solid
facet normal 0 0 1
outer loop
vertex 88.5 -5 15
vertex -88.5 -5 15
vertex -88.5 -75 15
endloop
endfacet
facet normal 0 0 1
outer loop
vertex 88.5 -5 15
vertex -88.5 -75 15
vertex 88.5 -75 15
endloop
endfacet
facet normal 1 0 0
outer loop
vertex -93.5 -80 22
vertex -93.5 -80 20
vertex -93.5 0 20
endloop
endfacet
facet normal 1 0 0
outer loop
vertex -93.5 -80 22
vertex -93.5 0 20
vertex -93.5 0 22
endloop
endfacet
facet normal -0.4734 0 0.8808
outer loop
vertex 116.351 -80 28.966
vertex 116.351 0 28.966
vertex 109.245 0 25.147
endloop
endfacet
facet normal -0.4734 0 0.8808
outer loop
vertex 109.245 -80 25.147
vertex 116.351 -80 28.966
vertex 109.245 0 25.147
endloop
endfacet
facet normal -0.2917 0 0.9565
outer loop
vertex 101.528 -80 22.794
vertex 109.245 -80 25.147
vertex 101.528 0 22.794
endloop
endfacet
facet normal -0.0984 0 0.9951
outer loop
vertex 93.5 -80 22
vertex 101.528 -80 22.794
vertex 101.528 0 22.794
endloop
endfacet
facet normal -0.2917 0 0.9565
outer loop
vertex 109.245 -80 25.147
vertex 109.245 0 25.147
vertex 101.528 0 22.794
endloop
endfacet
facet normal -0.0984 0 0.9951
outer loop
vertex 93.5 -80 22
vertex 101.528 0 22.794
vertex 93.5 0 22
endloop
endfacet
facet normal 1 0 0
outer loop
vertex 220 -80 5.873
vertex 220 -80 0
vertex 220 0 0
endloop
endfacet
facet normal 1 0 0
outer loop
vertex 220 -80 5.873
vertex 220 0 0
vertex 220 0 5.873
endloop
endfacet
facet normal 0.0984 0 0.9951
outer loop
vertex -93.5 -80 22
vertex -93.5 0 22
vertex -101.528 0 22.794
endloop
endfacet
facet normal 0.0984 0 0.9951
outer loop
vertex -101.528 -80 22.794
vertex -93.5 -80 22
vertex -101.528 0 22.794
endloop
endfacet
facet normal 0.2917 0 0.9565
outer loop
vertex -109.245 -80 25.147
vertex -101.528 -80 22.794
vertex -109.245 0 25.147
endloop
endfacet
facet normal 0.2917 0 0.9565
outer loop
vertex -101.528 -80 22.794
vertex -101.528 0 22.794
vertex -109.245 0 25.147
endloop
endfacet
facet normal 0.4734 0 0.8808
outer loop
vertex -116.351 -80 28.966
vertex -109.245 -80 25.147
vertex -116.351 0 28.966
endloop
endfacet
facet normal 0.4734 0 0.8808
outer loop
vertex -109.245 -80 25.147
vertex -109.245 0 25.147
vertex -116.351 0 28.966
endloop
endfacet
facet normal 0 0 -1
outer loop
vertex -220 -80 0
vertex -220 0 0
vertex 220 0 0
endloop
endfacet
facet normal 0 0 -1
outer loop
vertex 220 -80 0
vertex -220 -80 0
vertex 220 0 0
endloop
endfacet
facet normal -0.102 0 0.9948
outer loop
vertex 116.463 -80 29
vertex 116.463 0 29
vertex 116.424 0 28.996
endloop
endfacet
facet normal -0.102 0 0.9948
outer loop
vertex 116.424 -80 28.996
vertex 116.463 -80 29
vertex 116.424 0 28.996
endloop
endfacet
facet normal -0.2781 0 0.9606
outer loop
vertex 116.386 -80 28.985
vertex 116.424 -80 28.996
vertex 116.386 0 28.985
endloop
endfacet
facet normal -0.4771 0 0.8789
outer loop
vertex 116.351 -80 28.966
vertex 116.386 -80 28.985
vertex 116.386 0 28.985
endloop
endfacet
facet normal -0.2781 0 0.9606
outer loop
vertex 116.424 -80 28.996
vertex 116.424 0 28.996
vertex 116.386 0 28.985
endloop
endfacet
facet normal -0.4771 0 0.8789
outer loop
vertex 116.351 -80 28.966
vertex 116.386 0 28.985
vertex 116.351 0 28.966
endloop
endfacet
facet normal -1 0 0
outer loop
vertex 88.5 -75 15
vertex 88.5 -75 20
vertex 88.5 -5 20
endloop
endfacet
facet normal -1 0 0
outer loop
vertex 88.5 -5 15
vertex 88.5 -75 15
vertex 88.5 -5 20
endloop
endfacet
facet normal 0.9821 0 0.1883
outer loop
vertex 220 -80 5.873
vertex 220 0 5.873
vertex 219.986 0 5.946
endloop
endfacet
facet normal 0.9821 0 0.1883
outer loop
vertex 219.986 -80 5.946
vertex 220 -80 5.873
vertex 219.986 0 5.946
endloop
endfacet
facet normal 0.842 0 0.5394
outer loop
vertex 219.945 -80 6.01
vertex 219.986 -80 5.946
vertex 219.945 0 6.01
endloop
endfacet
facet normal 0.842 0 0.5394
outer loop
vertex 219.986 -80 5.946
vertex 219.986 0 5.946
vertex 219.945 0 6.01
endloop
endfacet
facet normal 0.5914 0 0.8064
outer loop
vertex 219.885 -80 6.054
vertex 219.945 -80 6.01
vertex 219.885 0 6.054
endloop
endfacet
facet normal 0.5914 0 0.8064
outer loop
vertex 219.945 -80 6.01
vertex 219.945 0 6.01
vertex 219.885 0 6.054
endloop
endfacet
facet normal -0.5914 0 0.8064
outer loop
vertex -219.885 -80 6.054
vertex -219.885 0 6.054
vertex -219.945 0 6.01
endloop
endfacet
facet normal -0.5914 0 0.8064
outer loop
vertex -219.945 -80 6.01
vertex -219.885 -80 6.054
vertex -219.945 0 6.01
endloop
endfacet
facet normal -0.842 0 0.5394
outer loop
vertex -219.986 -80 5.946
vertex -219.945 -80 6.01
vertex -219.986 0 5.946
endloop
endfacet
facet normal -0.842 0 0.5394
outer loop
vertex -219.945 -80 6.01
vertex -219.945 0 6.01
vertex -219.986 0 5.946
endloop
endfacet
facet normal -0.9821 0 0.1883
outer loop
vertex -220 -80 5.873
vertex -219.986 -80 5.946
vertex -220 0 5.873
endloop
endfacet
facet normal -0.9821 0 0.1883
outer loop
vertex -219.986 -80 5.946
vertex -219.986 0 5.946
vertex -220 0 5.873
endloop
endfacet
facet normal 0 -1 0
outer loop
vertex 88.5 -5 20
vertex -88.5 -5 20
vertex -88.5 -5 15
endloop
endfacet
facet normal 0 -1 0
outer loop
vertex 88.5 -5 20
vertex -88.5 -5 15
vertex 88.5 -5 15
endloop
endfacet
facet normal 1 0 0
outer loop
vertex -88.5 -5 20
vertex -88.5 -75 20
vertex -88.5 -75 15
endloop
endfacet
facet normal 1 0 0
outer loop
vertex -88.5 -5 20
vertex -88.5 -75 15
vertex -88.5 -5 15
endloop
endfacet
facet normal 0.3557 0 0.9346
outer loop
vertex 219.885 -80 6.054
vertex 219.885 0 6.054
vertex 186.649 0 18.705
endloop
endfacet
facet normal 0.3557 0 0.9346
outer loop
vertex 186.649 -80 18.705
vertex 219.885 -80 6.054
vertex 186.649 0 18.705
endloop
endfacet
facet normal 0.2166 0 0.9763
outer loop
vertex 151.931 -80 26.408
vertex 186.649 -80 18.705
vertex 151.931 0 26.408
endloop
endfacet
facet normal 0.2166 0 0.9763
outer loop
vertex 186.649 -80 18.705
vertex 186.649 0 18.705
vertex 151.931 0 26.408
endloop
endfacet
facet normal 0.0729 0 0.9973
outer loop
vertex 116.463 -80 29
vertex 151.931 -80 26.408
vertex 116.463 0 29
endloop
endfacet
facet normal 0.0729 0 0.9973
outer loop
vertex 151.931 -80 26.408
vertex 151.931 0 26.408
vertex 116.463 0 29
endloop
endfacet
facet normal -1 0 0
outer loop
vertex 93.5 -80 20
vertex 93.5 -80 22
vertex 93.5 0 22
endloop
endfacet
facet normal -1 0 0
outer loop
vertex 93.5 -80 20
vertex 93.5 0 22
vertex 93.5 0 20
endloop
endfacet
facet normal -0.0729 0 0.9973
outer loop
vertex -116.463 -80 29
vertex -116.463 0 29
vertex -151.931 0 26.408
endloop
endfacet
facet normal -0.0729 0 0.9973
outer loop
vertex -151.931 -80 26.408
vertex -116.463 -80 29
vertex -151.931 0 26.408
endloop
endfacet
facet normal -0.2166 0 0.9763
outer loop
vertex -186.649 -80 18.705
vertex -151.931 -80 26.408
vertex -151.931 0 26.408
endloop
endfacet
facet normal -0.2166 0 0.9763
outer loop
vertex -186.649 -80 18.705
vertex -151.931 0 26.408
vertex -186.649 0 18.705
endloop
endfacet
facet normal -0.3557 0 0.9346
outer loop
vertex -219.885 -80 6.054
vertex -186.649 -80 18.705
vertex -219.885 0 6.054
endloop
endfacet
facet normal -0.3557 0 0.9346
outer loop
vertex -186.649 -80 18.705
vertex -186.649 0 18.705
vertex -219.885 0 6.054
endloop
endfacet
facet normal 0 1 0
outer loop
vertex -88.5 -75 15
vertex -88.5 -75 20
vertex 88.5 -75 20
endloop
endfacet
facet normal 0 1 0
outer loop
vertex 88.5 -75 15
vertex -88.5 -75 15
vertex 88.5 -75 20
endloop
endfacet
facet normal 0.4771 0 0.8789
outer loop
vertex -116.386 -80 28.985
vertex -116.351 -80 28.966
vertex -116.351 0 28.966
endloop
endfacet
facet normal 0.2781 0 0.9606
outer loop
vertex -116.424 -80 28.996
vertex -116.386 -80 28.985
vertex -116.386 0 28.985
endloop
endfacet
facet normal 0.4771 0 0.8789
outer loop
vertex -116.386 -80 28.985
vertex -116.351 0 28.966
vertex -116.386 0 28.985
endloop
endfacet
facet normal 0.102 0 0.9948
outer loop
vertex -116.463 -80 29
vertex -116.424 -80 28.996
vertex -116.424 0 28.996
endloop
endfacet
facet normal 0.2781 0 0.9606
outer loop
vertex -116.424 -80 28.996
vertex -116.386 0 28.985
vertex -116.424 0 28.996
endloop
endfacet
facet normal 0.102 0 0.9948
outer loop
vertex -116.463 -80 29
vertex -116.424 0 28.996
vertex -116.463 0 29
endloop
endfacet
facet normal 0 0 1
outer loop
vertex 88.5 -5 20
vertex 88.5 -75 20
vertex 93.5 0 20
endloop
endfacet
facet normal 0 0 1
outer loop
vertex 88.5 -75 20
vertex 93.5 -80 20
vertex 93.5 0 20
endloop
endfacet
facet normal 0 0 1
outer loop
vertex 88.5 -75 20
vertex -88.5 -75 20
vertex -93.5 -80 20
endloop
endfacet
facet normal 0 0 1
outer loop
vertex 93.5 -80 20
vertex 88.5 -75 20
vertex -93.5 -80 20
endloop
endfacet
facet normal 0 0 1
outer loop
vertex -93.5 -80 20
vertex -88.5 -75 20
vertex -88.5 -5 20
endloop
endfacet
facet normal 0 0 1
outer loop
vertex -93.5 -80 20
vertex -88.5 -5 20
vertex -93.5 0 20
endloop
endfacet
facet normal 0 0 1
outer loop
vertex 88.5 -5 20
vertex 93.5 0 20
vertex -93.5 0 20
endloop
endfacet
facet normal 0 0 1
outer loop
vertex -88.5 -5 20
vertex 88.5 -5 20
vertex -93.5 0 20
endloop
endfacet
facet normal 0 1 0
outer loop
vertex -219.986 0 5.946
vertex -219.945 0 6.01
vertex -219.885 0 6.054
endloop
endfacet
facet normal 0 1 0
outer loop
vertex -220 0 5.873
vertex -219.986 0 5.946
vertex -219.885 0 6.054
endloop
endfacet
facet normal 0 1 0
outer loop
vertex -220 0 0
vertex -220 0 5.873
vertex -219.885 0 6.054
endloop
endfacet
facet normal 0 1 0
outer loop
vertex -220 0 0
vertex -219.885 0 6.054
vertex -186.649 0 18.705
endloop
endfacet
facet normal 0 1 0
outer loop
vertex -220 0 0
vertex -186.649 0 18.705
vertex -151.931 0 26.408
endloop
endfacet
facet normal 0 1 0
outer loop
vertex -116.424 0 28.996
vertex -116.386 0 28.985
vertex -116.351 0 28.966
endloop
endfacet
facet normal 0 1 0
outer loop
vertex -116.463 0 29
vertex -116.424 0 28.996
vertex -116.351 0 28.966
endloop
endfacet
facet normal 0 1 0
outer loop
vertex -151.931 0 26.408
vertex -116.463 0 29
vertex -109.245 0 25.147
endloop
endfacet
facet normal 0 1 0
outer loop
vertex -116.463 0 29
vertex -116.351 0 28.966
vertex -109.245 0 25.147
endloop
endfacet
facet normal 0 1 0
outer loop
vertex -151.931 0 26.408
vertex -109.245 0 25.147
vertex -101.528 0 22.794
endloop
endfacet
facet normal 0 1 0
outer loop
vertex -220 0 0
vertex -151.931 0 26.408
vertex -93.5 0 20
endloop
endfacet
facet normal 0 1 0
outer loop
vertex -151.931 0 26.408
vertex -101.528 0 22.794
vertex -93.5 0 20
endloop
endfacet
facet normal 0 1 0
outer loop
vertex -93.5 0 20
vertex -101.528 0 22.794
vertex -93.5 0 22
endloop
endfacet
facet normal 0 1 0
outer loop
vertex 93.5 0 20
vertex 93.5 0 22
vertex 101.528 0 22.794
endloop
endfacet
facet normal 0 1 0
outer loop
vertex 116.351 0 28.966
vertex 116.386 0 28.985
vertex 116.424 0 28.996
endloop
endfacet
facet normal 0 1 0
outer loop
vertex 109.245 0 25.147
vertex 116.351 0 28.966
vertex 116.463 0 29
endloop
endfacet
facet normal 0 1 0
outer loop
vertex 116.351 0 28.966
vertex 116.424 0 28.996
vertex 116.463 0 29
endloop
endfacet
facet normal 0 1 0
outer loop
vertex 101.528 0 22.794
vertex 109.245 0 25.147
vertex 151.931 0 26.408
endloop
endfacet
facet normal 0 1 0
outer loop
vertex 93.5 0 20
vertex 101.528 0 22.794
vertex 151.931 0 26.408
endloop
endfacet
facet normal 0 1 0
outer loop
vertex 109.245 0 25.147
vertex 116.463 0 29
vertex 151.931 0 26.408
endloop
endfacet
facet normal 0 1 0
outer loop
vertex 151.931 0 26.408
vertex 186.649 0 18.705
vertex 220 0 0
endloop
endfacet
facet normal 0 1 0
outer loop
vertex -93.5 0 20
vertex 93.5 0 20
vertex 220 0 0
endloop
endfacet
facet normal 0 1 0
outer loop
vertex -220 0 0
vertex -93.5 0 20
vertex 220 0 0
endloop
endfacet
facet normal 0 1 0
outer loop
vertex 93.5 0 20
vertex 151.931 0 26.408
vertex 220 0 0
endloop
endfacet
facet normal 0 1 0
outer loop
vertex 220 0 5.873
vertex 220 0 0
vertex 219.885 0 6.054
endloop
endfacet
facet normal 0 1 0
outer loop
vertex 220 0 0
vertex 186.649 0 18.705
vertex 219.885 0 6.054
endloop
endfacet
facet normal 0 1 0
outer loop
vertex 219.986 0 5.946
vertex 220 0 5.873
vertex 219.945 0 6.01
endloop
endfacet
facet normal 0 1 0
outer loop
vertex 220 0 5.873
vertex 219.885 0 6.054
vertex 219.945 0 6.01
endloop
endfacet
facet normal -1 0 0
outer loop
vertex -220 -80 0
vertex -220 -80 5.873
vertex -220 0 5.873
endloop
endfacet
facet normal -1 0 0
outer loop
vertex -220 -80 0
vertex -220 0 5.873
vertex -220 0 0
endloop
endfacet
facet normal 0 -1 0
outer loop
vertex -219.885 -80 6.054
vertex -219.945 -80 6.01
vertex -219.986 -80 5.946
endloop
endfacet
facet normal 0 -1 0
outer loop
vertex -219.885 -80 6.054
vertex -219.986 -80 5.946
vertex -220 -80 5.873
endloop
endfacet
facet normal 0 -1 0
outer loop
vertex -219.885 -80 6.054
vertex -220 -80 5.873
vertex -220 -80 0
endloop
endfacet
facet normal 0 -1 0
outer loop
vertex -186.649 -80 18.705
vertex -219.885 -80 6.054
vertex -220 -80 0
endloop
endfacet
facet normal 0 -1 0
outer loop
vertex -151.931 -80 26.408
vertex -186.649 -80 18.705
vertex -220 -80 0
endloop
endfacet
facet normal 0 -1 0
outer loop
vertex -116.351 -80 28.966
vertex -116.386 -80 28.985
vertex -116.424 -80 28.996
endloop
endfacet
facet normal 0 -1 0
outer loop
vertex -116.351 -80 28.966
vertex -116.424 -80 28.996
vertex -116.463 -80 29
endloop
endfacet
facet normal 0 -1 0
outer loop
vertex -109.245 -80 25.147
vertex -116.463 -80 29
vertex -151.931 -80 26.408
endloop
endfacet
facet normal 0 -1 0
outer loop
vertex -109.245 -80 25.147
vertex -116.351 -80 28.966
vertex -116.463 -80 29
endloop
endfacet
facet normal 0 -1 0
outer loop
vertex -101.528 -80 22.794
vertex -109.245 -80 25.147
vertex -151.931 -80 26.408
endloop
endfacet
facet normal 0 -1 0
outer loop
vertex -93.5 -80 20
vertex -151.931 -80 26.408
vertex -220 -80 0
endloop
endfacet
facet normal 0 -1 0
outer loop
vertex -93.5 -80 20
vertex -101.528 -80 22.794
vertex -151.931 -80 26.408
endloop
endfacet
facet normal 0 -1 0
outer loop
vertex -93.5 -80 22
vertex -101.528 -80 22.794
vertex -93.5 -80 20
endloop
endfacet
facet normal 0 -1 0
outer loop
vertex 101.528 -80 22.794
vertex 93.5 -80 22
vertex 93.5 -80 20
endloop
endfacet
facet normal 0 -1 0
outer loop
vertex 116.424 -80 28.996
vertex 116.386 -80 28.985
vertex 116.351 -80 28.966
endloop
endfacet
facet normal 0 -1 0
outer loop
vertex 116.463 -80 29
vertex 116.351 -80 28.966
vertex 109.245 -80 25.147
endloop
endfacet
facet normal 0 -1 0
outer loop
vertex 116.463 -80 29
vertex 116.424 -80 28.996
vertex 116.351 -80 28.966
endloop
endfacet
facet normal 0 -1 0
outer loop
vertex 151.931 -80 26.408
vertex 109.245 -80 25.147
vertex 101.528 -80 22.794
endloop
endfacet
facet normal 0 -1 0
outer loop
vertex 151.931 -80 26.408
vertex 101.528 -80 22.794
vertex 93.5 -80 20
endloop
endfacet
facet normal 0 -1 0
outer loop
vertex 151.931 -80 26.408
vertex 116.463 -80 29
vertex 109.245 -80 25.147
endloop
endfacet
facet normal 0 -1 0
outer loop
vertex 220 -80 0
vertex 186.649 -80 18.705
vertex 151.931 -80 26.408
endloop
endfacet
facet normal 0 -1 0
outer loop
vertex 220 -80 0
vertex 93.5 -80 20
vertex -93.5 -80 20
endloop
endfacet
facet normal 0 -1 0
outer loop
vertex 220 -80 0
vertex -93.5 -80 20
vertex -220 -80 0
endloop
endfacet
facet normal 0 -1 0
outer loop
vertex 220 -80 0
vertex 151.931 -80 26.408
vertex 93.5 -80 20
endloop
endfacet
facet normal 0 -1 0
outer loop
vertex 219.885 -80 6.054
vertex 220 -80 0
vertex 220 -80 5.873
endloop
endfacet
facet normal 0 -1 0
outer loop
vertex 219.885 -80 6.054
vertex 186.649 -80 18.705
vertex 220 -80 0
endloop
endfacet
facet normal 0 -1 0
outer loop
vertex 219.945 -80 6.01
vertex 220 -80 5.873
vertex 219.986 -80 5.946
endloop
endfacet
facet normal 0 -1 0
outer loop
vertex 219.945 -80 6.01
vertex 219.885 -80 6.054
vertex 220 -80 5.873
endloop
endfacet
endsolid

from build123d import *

# Parameters (mm, degrees)
F1_DEPTH = 80
F3_W     = 177
F3_H     = 70
F4_DEPTH = 5


# Not quite as in the source:
# - ends of sketch curves that miss each other by under 0.0002 mm in the source are joined


with BuildPart() as f1:
    # F0 (on Front) → F1 (new body)
    with BuildSketch(Plane.XZ):
        with BuildLine():
            Line((-220, 0), (0, 0))
            Line((0, 0), (220, 0))
            Line((220, 0), (220, 5.872634))
            ThreePointArc((220, 5.872634), (219.9686827703, 5.9800868873), (219.8845387701, 6.0538885071))
            ThreePointArc((219.8845387701, 6.0538885071), (169.4297421053, 23.1880267358), (116.462901, 28.9999923785))
            ThreePointArc((116.462901, 28.9999923785), (116.4045566452, 28.9913078859), (116.3512831377, 28.9659817952))
            ThreePointArc((116.3512831377, 28.9659817952), (105.4447272771, 23.7801763601), (93.5, 22))
            Line((93.5, 22), (93.5, 20))
            Line((93.5, 20), (0, 20))
            Line((0, 20), (-93.5, 20))
            Line((-93.5, 20), (-93.5, 22))
            ThreePointArc((-93.5, 22), (-105.4447272771, 23.7801763601), (-116.351282957, 28.965982064))
            ThreePointArc((-116.351282957, 28.965982064), (-116.4045566452, 28.9913078859), (-116.462901, 28.9999919938))
            ThreePointArc((-116.462901, 28.9999919938), (-169.4297421053, 23.1880267358), (-219.8845388425, 6.0538886623))
            ThreePointArc((-219.8845388425, 6.0538886623), (-219.9686827703, 5.9800868873), (-220, 5.872634))
            Line((-220, 5.872634), (-220, 0))
        make_face()
    extrude(amount=F1_DEPTH)

    # F3 (on face) → F4 (cut)
    with BuildSketch(Plane.XY.offset(20)):
        with Locations((0, -40)):
            Rectangle(F3_W, F3_H)
    extrude(amount=-F4_DEPTH, mode=Mode.SUBTRACT)


solid = f1.part
